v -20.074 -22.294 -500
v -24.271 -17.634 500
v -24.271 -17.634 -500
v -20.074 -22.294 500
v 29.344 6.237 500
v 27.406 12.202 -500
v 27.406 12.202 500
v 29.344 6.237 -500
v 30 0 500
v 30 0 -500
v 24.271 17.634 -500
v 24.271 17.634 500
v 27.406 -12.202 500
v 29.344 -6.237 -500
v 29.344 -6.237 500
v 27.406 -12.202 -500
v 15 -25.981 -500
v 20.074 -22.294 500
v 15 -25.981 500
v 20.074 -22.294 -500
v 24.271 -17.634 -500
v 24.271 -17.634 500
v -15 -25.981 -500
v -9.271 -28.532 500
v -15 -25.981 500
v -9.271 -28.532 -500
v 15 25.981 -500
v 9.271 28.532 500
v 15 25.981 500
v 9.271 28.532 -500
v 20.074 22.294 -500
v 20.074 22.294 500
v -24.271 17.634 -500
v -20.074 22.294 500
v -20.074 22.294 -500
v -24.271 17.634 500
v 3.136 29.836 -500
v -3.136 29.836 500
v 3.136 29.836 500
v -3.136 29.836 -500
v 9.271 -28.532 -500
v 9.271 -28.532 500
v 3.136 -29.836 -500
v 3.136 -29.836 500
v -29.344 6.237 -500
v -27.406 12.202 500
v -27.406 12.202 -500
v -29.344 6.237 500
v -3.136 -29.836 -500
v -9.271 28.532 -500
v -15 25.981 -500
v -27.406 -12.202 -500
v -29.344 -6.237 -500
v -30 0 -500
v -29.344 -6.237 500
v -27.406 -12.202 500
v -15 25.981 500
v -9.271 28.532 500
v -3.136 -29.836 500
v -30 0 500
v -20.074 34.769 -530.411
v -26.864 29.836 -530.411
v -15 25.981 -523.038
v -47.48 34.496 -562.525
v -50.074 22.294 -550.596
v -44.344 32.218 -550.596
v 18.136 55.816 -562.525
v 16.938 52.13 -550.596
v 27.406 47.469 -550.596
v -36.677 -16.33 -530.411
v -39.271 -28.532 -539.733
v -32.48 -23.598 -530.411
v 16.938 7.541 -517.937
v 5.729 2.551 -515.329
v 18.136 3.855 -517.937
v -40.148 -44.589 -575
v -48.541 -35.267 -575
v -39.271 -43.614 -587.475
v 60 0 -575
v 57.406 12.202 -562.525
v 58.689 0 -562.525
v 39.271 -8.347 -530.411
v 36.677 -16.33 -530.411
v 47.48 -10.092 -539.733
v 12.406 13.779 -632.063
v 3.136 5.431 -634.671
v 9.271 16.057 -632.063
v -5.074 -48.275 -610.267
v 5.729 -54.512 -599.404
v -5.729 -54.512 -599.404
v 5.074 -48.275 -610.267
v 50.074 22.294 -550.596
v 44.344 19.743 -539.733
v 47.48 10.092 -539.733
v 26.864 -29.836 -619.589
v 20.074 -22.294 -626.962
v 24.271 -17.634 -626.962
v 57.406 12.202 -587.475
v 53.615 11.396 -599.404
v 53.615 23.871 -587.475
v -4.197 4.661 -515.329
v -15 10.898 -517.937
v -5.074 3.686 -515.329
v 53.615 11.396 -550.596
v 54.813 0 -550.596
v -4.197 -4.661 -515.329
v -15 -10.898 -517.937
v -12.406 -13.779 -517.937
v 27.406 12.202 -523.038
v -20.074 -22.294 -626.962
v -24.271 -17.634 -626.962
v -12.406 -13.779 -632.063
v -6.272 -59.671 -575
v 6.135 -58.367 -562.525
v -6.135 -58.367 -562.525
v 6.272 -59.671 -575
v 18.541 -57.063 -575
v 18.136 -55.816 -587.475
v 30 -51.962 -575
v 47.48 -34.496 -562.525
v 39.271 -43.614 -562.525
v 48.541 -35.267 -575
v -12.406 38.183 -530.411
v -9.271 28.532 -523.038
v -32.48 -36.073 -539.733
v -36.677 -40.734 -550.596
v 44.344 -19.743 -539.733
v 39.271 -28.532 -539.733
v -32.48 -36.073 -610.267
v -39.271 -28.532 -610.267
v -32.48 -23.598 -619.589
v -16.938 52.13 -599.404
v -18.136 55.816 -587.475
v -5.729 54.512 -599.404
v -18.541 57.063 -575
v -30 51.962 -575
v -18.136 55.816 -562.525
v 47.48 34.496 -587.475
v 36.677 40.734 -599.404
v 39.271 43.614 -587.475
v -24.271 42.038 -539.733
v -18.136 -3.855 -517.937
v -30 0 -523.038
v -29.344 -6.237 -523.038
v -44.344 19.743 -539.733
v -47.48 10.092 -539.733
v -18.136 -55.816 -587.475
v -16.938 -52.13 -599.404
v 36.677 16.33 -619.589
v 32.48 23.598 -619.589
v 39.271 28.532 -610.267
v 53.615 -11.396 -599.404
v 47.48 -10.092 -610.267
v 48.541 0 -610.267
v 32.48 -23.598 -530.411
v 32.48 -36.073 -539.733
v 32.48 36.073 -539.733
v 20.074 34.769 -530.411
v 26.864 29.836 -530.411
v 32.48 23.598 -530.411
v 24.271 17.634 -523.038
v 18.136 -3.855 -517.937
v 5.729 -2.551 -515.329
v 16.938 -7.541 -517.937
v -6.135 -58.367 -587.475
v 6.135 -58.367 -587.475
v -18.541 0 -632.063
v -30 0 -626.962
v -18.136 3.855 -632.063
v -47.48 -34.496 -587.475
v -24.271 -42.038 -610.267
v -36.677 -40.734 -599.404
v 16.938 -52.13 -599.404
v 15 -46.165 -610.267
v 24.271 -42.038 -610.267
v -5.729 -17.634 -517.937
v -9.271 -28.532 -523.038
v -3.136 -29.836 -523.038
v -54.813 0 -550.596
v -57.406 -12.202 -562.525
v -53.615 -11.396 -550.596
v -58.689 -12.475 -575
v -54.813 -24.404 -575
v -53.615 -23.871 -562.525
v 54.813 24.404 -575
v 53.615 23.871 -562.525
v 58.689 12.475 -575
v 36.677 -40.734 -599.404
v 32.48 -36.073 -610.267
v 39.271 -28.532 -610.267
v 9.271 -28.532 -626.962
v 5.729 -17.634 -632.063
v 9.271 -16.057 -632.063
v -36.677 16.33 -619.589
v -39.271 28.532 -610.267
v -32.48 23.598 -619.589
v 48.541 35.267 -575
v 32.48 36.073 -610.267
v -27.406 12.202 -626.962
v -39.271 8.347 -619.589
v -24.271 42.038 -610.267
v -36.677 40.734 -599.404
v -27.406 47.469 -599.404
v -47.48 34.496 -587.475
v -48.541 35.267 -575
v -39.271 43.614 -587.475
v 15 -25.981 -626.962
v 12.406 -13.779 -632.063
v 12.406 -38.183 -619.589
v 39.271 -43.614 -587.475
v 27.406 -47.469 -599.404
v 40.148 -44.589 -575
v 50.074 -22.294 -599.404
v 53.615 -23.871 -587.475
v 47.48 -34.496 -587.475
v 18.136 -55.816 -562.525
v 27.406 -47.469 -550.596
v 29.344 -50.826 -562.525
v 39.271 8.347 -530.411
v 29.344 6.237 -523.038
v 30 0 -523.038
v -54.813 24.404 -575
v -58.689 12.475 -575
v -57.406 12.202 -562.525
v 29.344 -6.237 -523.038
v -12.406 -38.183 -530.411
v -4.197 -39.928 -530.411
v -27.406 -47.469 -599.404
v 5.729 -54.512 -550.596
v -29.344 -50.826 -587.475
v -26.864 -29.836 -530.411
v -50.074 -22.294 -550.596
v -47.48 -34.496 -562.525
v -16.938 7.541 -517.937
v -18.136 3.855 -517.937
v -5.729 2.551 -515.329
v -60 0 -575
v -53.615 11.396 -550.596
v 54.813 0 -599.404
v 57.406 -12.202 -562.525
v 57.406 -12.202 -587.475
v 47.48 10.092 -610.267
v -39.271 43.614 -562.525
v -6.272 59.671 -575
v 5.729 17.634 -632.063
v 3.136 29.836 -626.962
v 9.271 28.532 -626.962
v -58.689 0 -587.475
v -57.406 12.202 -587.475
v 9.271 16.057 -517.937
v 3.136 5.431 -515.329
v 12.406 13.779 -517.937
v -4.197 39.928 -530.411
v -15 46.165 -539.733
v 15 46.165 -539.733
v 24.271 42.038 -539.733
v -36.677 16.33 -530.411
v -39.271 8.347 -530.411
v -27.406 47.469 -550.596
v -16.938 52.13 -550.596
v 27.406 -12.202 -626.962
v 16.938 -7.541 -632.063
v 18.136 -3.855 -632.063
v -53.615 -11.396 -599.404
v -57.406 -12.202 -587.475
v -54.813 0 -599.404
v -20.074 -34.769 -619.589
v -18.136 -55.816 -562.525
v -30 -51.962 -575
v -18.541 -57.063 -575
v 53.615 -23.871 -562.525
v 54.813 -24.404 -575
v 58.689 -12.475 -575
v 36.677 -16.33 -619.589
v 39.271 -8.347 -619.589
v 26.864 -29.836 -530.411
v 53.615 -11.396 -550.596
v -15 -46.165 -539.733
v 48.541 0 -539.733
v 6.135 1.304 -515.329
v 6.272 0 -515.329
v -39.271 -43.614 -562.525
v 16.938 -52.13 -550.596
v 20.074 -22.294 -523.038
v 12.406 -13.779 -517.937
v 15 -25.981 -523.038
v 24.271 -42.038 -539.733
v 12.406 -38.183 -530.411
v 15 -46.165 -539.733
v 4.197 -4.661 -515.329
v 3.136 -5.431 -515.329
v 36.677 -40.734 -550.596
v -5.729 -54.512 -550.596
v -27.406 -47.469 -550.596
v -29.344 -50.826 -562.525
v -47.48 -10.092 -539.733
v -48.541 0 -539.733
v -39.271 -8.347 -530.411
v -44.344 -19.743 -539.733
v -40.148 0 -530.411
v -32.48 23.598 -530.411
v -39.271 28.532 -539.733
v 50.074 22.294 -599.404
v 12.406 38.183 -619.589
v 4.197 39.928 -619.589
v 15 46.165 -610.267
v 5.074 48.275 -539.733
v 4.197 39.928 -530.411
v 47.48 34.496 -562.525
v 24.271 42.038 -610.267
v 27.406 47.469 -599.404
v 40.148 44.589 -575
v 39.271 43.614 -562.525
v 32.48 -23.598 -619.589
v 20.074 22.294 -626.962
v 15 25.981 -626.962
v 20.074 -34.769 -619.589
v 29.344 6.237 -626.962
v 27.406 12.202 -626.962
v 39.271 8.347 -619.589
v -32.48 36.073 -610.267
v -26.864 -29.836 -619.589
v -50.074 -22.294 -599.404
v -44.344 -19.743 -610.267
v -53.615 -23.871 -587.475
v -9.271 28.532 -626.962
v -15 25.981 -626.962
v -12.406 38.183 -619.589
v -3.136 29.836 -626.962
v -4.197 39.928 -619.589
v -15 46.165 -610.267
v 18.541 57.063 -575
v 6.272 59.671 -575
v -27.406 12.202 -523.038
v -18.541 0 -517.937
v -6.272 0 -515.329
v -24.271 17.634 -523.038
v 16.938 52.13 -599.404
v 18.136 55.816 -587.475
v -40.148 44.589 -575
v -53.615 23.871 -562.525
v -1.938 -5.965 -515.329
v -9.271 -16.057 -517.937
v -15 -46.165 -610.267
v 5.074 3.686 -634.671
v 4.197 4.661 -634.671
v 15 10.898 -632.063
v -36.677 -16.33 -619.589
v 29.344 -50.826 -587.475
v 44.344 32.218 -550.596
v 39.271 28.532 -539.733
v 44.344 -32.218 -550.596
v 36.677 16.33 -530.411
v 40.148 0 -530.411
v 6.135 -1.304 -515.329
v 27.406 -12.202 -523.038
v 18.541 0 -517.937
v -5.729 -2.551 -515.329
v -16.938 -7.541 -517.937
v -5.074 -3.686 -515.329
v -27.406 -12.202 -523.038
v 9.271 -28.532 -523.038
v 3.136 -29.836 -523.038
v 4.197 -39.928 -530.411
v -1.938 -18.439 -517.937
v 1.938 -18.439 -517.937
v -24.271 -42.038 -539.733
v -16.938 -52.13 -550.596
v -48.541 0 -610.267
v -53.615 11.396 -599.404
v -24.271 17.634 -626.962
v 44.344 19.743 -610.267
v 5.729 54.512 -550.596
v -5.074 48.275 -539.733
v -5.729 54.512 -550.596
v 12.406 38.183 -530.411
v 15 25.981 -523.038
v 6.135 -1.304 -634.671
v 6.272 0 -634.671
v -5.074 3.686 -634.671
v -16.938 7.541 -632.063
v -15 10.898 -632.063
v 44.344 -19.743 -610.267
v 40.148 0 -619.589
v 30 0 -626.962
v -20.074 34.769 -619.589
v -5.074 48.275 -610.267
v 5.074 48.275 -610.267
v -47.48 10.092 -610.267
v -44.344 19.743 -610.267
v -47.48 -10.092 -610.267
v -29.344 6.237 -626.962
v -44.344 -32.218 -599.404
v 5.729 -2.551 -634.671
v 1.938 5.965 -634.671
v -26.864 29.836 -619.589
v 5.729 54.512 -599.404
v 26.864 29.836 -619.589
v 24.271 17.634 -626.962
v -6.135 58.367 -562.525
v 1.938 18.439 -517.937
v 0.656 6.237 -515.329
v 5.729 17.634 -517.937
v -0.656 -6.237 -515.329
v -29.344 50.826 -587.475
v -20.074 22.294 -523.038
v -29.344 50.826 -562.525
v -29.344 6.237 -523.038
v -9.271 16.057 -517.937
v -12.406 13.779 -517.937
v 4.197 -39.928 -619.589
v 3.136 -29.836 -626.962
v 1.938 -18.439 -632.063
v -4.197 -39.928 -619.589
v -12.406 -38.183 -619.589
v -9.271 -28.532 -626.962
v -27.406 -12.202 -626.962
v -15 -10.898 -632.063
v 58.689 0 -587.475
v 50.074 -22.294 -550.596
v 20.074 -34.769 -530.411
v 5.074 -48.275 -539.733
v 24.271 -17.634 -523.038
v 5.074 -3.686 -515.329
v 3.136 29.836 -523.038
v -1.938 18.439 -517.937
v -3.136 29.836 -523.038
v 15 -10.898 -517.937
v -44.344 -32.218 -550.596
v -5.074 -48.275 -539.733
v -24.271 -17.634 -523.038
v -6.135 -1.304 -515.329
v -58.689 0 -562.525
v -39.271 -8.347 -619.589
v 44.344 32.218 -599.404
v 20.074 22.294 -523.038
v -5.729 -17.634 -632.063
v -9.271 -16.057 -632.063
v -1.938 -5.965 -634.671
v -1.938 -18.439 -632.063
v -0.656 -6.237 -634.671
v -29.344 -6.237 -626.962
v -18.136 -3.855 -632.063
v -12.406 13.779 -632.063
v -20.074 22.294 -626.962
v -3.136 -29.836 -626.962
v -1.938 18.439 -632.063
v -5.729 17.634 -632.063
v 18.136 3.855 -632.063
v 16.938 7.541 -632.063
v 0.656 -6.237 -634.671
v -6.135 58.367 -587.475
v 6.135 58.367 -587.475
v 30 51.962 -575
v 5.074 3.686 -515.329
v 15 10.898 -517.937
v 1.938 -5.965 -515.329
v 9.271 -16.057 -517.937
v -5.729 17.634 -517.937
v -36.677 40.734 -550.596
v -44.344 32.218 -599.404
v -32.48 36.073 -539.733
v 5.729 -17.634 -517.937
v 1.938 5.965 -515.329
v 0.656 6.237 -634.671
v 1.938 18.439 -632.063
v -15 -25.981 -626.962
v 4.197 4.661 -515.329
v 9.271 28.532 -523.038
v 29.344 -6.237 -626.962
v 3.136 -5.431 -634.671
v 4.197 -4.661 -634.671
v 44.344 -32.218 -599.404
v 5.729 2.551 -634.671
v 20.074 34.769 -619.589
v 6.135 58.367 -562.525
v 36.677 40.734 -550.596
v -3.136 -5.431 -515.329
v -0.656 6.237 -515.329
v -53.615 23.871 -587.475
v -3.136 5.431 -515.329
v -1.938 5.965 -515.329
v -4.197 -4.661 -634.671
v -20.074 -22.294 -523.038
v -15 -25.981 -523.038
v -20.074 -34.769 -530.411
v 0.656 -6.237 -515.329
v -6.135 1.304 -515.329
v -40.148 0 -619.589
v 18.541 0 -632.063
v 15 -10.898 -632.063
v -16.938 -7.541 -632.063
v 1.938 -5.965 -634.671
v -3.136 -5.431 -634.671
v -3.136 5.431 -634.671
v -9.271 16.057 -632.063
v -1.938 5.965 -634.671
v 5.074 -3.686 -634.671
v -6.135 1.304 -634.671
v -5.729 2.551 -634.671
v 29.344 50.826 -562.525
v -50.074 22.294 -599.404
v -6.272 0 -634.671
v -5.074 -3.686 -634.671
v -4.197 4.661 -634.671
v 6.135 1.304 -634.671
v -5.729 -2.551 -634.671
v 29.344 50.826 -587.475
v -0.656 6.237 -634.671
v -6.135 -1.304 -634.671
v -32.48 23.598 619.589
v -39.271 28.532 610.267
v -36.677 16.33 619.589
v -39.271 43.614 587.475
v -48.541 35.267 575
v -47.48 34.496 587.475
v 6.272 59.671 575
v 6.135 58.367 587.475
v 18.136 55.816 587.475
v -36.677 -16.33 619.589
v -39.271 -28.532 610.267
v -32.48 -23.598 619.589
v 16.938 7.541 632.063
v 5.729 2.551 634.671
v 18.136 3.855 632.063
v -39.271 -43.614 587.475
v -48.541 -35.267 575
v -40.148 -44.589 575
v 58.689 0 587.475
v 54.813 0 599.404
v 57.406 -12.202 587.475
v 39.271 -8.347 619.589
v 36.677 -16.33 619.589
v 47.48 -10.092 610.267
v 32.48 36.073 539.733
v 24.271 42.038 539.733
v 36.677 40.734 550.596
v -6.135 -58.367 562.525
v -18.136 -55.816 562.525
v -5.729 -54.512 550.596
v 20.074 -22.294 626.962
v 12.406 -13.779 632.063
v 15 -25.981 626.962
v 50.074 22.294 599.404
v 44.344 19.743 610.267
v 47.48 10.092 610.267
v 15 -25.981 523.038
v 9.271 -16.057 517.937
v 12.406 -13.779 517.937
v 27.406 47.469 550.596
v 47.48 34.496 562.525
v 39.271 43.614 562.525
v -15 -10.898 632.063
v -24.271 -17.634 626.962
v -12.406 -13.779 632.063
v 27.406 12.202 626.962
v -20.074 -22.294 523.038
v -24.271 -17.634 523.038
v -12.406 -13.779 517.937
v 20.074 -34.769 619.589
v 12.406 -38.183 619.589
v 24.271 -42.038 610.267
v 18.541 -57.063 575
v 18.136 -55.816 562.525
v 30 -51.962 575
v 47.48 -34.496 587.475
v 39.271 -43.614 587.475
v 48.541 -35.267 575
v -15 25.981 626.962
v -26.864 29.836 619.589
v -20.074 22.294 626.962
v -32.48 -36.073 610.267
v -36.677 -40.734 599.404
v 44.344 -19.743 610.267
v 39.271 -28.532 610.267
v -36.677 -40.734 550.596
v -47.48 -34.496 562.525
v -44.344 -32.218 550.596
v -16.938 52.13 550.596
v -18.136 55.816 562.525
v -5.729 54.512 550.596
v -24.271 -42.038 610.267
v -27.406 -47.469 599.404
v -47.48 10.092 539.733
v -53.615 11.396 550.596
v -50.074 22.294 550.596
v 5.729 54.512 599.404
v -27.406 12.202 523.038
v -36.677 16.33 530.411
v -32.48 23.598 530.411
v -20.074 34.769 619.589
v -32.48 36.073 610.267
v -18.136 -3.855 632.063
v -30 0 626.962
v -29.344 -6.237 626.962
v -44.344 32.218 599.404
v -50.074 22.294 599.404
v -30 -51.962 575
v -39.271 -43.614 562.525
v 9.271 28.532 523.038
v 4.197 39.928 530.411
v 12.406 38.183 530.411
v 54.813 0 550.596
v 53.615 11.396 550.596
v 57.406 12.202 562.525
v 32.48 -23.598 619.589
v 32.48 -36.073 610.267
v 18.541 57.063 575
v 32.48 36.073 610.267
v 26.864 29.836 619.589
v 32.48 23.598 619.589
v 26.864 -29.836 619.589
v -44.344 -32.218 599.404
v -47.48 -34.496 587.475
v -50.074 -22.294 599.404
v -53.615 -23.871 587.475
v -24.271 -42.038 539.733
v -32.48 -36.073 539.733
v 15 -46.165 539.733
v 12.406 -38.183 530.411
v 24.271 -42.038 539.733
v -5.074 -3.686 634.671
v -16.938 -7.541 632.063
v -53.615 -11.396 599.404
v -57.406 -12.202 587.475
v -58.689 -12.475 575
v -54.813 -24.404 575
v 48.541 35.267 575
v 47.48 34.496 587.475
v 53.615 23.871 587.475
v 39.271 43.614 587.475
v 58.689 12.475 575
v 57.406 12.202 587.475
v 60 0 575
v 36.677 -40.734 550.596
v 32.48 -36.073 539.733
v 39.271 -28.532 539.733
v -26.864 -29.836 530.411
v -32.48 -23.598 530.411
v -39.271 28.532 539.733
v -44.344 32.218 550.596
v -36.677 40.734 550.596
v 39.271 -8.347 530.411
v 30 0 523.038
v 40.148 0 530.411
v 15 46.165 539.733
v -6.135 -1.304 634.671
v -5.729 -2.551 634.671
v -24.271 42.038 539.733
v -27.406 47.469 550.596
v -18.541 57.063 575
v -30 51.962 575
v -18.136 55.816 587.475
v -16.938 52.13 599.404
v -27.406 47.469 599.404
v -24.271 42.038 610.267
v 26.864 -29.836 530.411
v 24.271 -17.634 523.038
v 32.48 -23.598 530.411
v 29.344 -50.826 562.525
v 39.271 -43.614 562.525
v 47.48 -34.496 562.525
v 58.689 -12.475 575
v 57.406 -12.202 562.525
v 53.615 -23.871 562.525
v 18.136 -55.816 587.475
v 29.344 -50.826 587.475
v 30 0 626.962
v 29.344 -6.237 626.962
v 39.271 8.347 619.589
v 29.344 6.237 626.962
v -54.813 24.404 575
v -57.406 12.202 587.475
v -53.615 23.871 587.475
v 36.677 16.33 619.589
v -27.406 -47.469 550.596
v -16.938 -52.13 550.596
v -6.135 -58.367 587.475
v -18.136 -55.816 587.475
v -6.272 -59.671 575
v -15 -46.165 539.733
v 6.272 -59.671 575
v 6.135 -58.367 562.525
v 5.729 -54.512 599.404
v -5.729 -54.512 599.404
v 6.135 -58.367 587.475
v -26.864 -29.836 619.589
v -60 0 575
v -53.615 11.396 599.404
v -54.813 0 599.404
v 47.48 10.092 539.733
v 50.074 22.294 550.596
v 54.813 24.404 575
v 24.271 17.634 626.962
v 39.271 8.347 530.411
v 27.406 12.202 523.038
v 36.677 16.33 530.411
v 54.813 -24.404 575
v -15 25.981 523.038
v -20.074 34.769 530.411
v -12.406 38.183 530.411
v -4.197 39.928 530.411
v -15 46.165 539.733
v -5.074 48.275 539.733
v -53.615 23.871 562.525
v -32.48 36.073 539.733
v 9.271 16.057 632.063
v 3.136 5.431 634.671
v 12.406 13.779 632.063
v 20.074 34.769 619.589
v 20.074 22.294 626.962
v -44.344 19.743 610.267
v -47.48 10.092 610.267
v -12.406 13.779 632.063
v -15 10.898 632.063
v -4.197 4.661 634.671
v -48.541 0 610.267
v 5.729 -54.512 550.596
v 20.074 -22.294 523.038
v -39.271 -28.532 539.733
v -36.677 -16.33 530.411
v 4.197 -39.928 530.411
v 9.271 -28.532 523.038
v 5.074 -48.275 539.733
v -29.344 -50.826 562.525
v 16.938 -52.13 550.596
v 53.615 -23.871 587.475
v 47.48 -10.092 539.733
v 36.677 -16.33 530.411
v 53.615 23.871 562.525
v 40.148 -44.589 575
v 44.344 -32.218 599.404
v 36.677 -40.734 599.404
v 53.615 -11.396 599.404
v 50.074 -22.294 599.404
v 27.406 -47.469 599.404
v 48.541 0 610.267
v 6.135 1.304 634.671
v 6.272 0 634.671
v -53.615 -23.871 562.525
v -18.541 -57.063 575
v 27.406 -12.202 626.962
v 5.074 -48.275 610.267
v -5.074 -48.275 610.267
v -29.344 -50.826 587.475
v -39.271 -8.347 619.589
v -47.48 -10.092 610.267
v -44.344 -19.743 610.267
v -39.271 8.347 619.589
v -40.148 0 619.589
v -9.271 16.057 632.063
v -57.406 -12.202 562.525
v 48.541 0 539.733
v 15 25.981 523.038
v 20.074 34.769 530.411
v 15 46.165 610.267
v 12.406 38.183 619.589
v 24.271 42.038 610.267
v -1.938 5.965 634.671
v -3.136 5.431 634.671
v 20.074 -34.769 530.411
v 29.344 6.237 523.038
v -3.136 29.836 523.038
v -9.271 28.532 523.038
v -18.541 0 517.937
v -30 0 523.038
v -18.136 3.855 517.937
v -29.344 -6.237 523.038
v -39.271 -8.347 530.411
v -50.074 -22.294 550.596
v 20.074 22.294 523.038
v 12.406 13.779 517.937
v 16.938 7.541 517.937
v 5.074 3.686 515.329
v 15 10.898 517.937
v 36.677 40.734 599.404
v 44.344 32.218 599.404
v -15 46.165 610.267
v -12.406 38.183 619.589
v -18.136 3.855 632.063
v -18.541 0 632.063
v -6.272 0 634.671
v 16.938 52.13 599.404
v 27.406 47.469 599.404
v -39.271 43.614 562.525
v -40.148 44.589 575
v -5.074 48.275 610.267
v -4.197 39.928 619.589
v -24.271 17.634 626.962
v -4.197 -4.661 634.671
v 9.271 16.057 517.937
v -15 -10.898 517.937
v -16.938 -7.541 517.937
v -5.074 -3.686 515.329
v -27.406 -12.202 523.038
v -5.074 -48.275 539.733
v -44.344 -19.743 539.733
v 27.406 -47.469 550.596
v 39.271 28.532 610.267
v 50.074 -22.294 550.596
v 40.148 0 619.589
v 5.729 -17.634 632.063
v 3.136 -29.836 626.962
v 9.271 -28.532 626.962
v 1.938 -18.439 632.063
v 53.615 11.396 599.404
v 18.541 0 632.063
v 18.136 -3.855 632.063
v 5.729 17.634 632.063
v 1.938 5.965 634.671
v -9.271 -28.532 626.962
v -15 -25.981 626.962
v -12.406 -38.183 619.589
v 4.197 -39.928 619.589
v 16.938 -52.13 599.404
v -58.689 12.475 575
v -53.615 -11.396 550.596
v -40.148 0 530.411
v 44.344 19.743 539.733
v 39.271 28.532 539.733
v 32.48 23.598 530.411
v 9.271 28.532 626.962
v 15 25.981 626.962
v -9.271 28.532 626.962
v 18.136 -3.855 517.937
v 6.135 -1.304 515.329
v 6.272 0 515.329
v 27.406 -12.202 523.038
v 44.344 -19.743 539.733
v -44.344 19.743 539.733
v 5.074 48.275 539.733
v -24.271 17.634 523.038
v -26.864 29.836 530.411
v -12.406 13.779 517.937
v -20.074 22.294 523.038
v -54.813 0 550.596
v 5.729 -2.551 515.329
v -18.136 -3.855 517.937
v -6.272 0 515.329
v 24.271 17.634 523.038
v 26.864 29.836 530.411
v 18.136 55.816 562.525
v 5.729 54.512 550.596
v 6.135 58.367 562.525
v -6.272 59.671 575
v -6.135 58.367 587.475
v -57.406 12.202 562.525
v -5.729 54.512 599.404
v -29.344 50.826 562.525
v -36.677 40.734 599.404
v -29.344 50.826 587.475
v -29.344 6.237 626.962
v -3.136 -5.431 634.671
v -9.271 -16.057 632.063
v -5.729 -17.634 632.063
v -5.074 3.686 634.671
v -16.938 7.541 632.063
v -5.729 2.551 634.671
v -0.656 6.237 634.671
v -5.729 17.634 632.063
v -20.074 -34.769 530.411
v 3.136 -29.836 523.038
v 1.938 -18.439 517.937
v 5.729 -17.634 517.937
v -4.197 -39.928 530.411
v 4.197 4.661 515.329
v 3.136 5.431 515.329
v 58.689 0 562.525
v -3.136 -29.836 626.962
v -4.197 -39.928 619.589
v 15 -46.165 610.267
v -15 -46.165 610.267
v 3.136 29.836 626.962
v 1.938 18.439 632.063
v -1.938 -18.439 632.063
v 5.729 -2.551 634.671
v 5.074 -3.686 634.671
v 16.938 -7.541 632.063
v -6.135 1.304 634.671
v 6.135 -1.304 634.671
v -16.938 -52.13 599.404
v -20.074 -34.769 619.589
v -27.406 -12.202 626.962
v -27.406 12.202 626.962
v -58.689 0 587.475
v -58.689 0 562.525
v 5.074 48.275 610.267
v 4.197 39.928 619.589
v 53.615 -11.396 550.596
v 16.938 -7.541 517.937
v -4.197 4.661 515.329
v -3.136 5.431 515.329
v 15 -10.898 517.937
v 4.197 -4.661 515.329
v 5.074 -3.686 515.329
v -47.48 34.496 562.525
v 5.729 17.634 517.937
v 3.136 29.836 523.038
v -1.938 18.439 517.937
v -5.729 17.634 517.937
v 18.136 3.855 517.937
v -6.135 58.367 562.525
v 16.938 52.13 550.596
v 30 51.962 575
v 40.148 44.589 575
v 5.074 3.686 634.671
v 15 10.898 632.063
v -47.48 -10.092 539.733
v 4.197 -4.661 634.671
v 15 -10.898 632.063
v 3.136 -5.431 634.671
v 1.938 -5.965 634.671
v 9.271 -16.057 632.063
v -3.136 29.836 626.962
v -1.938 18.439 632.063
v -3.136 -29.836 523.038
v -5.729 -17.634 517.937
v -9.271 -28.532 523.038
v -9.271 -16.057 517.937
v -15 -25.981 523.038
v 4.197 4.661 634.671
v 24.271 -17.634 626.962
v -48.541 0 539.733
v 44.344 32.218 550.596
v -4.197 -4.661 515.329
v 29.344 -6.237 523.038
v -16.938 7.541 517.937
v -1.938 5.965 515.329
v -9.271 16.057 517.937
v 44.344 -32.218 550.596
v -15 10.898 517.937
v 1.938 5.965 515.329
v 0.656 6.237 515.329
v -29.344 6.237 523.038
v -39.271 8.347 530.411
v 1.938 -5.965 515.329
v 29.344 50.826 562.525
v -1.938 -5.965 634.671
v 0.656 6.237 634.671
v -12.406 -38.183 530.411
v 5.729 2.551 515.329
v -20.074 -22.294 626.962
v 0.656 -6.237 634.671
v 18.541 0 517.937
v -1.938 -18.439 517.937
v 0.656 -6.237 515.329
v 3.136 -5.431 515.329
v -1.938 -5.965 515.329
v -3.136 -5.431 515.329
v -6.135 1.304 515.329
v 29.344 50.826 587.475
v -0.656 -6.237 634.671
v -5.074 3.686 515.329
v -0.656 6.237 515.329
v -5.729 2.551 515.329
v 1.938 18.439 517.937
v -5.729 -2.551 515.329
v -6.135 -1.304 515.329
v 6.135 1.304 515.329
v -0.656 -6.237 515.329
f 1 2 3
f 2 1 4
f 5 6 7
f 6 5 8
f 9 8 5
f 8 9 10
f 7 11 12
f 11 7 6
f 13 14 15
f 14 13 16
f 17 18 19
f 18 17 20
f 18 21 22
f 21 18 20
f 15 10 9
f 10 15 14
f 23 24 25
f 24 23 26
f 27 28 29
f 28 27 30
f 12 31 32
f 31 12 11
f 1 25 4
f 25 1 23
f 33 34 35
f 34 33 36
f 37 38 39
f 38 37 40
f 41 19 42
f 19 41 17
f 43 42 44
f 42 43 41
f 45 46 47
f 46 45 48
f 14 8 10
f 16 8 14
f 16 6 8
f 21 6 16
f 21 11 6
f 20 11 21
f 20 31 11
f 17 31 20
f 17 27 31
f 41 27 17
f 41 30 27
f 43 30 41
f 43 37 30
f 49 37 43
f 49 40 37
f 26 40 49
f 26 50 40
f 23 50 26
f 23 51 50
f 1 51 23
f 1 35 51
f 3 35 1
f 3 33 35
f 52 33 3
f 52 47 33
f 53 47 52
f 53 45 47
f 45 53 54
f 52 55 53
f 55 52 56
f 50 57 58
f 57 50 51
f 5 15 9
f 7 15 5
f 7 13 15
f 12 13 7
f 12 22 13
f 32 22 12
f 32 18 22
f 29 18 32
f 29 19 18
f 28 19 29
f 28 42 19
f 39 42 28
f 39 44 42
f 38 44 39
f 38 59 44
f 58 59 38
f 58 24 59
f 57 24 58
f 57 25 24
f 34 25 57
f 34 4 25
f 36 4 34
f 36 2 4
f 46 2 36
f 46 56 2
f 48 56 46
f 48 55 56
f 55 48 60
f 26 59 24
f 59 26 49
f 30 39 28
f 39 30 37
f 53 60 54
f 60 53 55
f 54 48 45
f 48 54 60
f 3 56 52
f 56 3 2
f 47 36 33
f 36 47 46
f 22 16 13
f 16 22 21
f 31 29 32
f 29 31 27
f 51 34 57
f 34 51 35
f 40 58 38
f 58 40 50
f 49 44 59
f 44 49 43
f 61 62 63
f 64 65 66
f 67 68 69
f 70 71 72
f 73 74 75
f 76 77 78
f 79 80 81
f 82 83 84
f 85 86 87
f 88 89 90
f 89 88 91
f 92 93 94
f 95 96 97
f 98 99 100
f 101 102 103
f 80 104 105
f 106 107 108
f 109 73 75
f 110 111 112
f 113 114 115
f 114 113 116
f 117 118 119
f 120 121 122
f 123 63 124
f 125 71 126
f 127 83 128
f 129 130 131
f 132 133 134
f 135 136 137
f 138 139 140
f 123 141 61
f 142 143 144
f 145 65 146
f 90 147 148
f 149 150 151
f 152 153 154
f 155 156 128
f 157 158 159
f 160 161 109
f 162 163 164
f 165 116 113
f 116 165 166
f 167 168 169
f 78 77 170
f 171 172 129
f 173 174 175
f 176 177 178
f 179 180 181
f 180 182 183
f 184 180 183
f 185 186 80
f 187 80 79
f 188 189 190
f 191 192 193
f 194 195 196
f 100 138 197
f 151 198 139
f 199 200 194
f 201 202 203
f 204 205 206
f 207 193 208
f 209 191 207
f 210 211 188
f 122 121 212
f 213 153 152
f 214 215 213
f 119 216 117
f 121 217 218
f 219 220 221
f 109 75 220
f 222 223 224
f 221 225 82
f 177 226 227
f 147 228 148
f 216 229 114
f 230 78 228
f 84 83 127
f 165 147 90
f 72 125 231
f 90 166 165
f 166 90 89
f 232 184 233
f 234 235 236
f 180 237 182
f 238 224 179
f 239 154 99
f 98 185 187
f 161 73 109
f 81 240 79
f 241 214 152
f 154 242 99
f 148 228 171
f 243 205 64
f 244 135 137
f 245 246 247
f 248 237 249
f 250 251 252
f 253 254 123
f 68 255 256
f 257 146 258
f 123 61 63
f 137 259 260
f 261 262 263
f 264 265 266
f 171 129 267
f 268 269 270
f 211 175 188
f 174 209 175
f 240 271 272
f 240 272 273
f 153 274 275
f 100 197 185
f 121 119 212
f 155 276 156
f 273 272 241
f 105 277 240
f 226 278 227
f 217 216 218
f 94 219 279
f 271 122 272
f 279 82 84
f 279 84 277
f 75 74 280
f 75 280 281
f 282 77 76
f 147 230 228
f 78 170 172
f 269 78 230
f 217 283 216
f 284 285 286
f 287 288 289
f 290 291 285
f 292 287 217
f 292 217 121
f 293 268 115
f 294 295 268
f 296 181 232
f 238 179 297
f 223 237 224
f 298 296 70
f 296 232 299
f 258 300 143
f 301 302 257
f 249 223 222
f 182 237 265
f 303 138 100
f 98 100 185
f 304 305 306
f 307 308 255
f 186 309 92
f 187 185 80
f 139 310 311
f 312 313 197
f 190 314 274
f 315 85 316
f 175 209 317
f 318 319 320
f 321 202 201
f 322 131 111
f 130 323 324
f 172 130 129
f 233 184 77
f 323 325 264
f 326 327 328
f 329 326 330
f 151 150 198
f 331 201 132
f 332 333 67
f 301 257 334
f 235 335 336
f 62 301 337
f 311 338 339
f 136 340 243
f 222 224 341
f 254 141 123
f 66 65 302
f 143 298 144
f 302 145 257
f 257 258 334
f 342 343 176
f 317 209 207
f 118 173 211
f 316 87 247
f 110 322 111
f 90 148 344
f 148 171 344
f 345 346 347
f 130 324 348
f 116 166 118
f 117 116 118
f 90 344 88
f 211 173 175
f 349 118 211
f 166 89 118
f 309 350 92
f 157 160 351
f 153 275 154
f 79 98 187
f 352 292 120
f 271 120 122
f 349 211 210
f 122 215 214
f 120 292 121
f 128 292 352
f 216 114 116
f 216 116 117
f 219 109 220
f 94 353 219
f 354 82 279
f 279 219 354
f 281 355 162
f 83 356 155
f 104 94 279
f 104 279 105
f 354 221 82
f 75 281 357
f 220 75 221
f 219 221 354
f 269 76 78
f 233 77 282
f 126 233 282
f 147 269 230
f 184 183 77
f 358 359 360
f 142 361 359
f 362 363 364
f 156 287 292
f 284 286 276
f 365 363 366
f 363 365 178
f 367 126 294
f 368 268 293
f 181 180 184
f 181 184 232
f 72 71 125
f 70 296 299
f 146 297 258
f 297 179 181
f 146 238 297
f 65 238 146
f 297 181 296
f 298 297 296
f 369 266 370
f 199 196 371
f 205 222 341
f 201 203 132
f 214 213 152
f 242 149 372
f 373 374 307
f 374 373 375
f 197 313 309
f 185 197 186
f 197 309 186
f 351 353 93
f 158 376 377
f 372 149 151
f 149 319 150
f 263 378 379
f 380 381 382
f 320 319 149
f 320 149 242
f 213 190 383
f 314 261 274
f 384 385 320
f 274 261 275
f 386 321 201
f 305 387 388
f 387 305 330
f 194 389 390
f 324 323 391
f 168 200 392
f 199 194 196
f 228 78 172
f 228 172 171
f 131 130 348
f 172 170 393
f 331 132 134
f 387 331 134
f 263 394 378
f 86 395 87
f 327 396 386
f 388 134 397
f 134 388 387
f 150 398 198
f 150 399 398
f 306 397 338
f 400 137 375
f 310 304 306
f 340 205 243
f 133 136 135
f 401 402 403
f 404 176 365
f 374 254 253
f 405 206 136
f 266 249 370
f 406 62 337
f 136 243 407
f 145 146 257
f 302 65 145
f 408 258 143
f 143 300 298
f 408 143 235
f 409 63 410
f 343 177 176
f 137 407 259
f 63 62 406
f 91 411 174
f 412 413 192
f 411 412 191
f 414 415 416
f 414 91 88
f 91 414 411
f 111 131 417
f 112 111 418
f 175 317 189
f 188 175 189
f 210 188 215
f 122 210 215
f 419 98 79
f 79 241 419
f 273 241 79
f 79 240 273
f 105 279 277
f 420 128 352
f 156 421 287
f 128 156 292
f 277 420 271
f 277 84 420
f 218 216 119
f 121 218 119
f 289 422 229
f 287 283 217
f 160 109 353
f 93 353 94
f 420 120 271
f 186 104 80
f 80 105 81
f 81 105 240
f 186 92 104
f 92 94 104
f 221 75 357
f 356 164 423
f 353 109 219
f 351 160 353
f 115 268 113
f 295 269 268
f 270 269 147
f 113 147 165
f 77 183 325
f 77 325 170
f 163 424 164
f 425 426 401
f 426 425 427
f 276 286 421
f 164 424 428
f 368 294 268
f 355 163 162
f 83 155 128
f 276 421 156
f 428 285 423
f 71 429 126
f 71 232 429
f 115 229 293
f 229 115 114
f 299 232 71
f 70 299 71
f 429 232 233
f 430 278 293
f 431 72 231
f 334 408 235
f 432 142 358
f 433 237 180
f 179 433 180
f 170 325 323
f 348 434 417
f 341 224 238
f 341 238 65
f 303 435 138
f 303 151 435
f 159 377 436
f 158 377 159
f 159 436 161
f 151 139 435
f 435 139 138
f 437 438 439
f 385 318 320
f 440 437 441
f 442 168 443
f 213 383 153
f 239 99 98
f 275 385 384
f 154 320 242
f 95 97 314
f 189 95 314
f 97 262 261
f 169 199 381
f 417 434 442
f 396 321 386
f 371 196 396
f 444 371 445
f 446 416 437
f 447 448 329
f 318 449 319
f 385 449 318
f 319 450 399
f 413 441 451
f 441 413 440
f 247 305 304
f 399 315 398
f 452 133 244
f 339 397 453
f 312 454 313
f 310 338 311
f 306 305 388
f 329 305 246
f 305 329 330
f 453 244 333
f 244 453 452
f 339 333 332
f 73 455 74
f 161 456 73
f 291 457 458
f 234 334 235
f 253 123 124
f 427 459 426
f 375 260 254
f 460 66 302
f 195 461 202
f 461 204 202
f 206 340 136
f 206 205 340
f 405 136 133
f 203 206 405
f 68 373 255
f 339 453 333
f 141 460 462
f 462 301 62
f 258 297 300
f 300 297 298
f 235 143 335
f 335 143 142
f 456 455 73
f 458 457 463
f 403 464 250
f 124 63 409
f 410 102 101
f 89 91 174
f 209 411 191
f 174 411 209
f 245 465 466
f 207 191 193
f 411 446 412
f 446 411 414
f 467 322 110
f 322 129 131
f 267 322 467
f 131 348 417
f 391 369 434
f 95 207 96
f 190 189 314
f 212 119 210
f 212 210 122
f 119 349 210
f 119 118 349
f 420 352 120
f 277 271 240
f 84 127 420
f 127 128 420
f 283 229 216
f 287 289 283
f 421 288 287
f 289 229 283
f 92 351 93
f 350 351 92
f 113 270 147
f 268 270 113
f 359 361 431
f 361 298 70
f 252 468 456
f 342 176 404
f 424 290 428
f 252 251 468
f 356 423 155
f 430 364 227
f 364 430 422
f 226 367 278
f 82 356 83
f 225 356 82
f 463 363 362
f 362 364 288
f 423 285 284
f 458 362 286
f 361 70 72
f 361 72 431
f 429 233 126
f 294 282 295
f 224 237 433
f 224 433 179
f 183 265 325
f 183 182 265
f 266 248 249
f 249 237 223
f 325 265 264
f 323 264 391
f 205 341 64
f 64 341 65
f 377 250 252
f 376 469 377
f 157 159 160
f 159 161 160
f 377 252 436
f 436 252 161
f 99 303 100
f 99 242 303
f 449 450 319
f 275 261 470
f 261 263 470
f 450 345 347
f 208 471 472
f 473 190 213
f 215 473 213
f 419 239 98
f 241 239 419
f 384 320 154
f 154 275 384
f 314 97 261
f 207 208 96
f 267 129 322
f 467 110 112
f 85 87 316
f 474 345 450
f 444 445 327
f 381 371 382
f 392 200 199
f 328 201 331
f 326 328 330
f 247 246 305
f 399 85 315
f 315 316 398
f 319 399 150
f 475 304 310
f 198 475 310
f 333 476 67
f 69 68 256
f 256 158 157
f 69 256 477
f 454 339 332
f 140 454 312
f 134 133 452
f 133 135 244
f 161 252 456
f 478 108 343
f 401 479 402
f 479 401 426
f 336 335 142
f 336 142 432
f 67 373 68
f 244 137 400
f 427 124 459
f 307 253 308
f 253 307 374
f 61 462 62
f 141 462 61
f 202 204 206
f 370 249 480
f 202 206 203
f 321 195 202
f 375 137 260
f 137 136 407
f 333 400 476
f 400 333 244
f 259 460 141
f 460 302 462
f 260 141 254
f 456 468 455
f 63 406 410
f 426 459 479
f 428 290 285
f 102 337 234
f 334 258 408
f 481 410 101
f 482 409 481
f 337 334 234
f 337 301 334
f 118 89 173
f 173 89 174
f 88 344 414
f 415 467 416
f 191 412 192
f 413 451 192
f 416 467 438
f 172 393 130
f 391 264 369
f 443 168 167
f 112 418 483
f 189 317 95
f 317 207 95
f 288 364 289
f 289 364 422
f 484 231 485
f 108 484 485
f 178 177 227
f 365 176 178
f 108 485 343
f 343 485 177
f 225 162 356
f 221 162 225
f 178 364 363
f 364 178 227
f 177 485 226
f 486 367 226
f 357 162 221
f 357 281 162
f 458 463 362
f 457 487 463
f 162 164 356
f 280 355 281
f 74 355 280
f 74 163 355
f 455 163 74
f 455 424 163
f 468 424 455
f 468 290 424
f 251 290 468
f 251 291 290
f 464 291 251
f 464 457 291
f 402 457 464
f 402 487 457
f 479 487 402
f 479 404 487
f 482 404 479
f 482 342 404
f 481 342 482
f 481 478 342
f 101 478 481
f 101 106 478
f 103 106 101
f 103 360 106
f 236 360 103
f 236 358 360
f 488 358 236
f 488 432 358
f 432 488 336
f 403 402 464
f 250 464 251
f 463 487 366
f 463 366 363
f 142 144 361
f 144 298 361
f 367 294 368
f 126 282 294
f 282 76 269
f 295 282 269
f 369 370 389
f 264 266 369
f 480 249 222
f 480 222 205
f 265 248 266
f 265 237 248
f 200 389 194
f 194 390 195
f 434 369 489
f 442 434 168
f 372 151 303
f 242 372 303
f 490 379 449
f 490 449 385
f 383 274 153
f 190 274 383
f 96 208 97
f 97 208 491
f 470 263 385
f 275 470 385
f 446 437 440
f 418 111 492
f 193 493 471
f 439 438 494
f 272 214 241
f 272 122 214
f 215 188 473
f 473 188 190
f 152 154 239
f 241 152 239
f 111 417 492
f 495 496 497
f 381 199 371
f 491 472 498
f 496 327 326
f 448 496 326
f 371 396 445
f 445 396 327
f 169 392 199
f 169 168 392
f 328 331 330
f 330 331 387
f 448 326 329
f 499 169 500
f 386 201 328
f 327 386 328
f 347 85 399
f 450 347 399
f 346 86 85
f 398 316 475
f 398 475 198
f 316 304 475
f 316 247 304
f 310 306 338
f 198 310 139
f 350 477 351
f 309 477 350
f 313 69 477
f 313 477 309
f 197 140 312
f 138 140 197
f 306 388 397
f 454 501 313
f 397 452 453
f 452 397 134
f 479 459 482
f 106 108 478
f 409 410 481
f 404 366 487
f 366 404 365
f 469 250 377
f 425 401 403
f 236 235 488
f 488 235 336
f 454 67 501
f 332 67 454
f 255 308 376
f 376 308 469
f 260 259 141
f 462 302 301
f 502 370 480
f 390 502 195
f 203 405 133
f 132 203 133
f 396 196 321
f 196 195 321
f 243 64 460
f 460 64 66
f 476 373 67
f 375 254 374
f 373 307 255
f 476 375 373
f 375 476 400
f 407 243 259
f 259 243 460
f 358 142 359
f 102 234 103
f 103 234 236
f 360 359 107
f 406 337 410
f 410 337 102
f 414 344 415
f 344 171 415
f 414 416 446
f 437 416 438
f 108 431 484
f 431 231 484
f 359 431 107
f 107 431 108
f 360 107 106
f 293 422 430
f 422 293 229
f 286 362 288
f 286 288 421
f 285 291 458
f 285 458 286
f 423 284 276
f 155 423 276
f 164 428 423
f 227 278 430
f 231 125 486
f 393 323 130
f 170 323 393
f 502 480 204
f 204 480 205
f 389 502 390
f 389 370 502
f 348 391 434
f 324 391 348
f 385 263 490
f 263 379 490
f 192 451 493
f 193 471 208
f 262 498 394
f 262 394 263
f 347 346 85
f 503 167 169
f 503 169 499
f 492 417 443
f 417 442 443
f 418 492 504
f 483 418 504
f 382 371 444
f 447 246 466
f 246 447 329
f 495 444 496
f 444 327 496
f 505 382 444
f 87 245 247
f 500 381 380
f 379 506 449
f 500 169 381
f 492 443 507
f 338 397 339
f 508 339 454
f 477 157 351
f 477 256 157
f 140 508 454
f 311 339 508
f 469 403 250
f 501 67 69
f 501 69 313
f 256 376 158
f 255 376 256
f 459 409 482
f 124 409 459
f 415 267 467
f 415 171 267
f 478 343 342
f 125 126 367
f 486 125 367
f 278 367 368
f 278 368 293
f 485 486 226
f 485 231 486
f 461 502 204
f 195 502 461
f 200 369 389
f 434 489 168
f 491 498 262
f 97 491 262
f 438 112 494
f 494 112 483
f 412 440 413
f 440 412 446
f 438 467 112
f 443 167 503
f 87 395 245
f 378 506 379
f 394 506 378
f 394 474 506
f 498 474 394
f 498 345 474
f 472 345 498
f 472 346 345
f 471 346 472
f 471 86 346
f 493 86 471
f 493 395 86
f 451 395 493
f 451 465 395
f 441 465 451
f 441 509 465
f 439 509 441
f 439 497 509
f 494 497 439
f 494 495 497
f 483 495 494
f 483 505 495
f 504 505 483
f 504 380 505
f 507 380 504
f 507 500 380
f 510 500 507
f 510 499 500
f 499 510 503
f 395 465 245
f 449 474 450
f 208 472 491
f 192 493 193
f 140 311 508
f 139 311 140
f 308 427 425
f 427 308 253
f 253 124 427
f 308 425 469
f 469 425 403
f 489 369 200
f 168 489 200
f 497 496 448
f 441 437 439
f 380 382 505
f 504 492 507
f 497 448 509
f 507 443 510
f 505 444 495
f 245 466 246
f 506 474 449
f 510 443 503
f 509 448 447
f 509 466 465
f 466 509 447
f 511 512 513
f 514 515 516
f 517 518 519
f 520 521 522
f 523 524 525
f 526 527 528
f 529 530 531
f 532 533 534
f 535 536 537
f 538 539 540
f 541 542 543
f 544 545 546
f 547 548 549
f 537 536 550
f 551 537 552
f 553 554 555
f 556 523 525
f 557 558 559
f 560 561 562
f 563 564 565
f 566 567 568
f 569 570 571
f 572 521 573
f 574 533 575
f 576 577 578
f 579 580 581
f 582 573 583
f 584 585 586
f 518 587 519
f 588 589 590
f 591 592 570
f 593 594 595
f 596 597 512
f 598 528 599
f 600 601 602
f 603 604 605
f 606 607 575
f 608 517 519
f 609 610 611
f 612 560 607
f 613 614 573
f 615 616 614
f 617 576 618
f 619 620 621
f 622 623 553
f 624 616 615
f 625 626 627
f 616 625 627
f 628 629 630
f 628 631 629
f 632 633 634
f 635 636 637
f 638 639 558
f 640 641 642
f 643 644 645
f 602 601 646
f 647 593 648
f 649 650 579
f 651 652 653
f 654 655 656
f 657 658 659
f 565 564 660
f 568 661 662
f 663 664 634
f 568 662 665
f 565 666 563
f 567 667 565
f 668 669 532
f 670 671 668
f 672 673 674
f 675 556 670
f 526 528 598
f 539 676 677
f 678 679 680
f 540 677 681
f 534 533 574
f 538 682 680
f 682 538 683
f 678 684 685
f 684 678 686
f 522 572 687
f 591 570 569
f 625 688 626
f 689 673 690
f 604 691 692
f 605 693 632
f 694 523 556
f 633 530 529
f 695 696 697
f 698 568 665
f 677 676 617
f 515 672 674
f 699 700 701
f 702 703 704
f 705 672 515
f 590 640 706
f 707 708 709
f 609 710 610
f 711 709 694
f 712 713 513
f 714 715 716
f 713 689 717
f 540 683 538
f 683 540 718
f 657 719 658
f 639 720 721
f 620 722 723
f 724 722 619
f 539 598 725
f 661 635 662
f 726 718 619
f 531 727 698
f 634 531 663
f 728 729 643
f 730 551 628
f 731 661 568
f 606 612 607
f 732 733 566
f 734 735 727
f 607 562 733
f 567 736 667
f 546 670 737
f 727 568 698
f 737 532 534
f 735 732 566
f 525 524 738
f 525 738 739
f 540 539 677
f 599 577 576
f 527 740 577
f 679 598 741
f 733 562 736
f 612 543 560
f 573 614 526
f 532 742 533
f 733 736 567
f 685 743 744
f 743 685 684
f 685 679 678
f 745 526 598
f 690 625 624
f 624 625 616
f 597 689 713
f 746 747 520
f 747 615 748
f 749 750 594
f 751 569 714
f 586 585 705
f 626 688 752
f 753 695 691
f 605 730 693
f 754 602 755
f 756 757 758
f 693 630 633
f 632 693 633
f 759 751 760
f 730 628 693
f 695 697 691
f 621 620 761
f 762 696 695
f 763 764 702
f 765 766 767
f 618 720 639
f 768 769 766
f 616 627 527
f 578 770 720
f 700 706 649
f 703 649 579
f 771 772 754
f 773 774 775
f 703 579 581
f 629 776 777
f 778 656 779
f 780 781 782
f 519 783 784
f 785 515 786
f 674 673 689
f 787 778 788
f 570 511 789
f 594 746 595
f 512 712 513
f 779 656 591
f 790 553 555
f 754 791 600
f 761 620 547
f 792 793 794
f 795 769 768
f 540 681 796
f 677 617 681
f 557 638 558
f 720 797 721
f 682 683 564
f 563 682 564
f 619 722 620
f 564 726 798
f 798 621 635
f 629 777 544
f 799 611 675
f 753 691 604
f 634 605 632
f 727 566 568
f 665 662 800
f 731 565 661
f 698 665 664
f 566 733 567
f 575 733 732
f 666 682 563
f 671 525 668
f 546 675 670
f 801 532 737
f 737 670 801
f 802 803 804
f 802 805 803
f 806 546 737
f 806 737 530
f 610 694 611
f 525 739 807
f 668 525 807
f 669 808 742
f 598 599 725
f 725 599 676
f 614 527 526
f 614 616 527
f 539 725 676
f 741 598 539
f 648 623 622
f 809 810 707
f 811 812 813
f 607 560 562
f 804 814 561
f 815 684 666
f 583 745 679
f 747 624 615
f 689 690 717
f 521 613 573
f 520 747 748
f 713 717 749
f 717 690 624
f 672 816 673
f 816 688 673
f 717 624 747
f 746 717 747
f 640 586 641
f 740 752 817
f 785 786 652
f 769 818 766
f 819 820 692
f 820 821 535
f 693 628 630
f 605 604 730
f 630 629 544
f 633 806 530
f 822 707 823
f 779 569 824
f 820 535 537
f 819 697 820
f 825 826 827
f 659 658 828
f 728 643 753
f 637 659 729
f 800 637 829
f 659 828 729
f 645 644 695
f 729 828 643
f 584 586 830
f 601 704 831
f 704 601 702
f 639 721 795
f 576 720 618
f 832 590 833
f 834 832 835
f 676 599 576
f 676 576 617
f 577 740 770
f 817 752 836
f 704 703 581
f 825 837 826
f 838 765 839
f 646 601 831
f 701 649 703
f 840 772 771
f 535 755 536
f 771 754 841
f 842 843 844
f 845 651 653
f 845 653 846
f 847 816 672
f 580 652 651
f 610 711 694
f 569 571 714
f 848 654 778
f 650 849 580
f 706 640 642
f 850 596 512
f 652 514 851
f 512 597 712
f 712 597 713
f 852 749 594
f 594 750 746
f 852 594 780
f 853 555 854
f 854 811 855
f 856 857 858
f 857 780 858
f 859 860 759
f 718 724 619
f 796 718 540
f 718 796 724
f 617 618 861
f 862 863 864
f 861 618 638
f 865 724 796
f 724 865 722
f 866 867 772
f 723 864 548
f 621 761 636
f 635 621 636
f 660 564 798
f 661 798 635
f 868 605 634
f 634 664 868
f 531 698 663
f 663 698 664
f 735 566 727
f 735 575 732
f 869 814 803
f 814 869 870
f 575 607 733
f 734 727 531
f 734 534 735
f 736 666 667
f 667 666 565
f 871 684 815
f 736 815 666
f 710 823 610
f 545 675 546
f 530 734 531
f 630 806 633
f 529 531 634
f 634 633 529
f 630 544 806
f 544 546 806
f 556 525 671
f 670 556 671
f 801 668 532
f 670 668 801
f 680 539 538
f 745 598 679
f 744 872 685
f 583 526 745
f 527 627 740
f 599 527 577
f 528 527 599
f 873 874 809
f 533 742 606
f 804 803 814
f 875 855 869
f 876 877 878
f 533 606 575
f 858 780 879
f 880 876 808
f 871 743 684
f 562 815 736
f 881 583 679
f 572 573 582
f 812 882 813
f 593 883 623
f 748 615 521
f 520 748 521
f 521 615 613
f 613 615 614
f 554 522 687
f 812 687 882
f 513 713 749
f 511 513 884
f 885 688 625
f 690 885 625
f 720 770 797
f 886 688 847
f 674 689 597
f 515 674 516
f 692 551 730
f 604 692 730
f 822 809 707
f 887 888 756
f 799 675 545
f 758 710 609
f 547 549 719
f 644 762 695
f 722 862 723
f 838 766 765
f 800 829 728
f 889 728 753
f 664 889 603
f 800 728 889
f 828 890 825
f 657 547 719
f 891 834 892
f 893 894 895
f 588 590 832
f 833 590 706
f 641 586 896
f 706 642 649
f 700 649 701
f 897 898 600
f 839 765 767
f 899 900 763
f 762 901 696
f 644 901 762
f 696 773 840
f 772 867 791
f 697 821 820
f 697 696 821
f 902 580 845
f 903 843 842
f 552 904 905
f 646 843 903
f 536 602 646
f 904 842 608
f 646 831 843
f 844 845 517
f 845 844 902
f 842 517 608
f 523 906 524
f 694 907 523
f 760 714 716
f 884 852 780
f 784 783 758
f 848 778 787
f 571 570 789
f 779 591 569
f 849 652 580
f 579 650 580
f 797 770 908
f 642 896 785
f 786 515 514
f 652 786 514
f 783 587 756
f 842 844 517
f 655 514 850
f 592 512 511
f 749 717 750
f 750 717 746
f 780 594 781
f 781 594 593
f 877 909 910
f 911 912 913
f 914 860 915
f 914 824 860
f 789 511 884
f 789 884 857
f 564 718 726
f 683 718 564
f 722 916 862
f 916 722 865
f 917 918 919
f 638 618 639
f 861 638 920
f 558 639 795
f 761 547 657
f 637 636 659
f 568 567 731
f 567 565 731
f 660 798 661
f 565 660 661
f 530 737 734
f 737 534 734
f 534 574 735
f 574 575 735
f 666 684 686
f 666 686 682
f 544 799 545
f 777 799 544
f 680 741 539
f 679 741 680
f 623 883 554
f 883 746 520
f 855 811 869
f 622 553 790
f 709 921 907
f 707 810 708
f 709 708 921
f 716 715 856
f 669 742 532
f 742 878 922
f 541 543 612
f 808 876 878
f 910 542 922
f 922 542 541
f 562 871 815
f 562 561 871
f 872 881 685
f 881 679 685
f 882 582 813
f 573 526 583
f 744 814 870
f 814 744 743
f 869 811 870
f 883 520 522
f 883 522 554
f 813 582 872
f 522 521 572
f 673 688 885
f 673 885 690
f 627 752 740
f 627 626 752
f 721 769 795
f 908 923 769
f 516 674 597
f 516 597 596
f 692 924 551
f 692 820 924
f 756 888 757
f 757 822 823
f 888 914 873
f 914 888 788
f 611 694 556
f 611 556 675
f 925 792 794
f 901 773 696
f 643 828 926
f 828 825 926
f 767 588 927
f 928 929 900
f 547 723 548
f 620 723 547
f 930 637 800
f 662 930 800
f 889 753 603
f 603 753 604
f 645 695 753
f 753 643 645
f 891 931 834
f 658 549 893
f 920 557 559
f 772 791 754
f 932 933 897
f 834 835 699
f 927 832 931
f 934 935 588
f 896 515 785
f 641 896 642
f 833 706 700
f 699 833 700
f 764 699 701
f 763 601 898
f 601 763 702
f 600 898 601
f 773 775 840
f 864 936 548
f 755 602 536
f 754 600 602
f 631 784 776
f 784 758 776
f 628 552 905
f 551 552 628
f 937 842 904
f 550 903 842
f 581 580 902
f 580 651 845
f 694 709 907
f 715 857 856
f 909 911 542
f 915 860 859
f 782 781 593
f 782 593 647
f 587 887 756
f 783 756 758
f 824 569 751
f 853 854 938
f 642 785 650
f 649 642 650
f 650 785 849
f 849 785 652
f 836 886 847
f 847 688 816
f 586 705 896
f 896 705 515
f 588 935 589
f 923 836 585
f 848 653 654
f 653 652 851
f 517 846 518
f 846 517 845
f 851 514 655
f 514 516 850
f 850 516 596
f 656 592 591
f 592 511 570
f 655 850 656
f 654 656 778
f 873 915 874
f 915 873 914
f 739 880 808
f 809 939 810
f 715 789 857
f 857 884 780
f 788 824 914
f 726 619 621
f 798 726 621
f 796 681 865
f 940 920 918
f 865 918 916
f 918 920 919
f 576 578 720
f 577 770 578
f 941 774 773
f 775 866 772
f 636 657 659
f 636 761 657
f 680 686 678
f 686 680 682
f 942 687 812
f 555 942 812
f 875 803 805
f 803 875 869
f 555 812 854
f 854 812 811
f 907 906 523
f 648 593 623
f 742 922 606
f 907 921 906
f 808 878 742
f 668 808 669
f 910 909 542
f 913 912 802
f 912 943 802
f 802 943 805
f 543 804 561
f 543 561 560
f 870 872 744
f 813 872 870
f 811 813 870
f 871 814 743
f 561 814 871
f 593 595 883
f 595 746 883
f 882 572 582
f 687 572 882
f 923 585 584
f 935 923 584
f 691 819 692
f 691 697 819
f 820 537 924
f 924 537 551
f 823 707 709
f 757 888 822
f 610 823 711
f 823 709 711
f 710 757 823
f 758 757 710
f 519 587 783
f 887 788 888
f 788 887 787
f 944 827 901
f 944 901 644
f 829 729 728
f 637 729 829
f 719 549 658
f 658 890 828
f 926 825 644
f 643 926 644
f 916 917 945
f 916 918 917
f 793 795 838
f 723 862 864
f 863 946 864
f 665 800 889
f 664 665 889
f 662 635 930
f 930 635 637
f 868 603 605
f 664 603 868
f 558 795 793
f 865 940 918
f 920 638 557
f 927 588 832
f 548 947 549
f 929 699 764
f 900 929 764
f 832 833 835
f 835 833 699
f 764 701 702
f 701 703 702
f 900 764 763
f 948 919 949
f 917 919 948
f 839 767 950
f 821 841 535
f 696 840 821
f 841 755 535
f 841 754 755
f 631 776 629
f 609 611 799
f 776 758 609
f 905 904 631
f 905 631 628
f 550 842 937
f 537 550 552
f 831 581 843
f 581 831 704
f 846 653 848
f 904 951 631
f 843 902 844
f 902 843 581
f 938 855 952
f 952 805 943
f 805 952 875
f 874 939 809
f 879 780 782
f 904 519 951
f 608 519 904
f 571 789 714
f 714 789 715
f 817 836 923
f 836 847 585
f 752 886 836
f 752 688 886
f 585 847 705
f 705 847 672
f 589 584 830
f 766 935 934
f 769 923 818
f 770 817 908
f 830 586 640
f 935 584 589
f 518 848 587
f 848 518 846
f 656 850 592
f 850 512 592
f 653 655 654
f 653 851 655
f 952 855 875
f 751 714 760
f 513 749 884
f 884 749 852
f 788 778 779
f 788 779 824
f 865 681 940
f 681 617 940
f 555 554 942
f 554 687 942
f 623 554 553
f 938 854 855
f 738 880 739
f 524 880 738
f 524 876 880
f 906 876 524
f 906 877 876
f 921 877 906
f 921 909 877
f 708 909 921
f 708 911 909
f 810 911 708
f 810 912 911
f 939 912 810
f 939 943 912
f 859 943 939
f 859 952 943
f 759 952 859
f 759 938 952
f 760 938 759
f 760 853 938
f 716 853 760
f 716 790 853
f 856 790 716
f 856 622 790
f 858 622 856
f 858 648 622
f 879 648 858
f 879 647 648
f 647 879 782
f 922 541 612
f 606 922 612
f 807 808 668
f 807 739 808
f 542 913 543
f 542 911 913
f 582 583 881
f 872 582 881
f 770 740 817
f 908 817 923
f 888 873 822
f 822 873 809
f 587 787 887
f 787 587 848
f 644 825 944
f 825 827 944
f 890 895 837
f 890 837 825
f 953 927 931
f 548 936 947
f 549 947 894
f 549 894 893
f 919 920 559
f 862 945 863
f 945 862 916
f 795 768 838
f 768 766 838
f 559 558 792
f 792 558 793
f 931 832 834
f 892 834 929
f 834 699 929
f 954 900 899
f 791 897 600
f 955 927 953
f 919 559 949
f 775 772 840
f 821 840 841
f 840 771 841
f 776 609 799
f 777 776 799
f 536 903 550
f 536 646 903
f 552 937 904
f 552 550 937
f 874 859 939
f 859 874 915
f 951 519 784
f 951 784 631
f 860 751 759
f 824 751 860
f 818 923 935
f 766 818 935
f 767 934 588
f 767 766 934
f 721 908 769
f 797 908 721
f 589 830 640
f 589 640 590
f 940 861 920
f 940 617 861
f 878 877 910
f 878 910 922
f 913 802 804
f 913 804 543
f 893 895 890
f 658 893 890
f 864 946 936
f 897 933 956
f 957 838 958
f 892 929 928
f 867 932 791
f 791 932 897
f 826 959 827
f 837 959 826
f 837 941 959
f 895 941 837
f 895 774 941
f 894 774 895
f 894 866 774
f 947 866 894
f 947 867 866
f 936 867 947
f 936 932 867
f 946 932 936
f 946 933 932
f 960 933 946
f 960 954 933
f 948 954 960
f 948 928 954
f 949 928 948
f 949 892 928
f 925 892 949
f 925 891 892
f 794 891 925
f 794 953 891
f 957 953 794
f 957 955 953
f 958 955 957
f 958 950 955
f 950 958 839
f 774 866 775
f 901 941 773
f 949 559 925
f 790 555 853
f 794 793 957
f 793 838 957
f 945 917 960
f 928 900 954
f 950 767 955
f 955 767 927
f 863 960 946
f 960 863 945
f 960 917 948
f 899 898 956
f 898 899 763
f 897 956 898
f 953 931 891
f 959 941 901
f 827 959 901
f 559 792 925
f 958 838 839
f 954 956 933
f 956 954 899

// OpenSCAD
// Units: millimeters (1 cm = 10 mm)
sphere_r = 60;      // 6 cm
cyl_dia = 60;       // 6 cm
cyl_len = 1000;     // 100 cm (1 meter)
gap = 150;          // 15 cm between spheres (center-to-center gap)

// Combine shapes
union() {
    // Cylinder in the middle
    cylinder(d = cyl_dia, h = cyl_len, center = true);

    // Left sphere
    translate([0, 0, -(cyl_len / 2 + gap / 2)])
        sphere(r = sphere_r);

    // Right sphere
    translate([0, 0, (cyl_len / 2 + gap / 2)])
        sphere(r = sphere_r);
}
